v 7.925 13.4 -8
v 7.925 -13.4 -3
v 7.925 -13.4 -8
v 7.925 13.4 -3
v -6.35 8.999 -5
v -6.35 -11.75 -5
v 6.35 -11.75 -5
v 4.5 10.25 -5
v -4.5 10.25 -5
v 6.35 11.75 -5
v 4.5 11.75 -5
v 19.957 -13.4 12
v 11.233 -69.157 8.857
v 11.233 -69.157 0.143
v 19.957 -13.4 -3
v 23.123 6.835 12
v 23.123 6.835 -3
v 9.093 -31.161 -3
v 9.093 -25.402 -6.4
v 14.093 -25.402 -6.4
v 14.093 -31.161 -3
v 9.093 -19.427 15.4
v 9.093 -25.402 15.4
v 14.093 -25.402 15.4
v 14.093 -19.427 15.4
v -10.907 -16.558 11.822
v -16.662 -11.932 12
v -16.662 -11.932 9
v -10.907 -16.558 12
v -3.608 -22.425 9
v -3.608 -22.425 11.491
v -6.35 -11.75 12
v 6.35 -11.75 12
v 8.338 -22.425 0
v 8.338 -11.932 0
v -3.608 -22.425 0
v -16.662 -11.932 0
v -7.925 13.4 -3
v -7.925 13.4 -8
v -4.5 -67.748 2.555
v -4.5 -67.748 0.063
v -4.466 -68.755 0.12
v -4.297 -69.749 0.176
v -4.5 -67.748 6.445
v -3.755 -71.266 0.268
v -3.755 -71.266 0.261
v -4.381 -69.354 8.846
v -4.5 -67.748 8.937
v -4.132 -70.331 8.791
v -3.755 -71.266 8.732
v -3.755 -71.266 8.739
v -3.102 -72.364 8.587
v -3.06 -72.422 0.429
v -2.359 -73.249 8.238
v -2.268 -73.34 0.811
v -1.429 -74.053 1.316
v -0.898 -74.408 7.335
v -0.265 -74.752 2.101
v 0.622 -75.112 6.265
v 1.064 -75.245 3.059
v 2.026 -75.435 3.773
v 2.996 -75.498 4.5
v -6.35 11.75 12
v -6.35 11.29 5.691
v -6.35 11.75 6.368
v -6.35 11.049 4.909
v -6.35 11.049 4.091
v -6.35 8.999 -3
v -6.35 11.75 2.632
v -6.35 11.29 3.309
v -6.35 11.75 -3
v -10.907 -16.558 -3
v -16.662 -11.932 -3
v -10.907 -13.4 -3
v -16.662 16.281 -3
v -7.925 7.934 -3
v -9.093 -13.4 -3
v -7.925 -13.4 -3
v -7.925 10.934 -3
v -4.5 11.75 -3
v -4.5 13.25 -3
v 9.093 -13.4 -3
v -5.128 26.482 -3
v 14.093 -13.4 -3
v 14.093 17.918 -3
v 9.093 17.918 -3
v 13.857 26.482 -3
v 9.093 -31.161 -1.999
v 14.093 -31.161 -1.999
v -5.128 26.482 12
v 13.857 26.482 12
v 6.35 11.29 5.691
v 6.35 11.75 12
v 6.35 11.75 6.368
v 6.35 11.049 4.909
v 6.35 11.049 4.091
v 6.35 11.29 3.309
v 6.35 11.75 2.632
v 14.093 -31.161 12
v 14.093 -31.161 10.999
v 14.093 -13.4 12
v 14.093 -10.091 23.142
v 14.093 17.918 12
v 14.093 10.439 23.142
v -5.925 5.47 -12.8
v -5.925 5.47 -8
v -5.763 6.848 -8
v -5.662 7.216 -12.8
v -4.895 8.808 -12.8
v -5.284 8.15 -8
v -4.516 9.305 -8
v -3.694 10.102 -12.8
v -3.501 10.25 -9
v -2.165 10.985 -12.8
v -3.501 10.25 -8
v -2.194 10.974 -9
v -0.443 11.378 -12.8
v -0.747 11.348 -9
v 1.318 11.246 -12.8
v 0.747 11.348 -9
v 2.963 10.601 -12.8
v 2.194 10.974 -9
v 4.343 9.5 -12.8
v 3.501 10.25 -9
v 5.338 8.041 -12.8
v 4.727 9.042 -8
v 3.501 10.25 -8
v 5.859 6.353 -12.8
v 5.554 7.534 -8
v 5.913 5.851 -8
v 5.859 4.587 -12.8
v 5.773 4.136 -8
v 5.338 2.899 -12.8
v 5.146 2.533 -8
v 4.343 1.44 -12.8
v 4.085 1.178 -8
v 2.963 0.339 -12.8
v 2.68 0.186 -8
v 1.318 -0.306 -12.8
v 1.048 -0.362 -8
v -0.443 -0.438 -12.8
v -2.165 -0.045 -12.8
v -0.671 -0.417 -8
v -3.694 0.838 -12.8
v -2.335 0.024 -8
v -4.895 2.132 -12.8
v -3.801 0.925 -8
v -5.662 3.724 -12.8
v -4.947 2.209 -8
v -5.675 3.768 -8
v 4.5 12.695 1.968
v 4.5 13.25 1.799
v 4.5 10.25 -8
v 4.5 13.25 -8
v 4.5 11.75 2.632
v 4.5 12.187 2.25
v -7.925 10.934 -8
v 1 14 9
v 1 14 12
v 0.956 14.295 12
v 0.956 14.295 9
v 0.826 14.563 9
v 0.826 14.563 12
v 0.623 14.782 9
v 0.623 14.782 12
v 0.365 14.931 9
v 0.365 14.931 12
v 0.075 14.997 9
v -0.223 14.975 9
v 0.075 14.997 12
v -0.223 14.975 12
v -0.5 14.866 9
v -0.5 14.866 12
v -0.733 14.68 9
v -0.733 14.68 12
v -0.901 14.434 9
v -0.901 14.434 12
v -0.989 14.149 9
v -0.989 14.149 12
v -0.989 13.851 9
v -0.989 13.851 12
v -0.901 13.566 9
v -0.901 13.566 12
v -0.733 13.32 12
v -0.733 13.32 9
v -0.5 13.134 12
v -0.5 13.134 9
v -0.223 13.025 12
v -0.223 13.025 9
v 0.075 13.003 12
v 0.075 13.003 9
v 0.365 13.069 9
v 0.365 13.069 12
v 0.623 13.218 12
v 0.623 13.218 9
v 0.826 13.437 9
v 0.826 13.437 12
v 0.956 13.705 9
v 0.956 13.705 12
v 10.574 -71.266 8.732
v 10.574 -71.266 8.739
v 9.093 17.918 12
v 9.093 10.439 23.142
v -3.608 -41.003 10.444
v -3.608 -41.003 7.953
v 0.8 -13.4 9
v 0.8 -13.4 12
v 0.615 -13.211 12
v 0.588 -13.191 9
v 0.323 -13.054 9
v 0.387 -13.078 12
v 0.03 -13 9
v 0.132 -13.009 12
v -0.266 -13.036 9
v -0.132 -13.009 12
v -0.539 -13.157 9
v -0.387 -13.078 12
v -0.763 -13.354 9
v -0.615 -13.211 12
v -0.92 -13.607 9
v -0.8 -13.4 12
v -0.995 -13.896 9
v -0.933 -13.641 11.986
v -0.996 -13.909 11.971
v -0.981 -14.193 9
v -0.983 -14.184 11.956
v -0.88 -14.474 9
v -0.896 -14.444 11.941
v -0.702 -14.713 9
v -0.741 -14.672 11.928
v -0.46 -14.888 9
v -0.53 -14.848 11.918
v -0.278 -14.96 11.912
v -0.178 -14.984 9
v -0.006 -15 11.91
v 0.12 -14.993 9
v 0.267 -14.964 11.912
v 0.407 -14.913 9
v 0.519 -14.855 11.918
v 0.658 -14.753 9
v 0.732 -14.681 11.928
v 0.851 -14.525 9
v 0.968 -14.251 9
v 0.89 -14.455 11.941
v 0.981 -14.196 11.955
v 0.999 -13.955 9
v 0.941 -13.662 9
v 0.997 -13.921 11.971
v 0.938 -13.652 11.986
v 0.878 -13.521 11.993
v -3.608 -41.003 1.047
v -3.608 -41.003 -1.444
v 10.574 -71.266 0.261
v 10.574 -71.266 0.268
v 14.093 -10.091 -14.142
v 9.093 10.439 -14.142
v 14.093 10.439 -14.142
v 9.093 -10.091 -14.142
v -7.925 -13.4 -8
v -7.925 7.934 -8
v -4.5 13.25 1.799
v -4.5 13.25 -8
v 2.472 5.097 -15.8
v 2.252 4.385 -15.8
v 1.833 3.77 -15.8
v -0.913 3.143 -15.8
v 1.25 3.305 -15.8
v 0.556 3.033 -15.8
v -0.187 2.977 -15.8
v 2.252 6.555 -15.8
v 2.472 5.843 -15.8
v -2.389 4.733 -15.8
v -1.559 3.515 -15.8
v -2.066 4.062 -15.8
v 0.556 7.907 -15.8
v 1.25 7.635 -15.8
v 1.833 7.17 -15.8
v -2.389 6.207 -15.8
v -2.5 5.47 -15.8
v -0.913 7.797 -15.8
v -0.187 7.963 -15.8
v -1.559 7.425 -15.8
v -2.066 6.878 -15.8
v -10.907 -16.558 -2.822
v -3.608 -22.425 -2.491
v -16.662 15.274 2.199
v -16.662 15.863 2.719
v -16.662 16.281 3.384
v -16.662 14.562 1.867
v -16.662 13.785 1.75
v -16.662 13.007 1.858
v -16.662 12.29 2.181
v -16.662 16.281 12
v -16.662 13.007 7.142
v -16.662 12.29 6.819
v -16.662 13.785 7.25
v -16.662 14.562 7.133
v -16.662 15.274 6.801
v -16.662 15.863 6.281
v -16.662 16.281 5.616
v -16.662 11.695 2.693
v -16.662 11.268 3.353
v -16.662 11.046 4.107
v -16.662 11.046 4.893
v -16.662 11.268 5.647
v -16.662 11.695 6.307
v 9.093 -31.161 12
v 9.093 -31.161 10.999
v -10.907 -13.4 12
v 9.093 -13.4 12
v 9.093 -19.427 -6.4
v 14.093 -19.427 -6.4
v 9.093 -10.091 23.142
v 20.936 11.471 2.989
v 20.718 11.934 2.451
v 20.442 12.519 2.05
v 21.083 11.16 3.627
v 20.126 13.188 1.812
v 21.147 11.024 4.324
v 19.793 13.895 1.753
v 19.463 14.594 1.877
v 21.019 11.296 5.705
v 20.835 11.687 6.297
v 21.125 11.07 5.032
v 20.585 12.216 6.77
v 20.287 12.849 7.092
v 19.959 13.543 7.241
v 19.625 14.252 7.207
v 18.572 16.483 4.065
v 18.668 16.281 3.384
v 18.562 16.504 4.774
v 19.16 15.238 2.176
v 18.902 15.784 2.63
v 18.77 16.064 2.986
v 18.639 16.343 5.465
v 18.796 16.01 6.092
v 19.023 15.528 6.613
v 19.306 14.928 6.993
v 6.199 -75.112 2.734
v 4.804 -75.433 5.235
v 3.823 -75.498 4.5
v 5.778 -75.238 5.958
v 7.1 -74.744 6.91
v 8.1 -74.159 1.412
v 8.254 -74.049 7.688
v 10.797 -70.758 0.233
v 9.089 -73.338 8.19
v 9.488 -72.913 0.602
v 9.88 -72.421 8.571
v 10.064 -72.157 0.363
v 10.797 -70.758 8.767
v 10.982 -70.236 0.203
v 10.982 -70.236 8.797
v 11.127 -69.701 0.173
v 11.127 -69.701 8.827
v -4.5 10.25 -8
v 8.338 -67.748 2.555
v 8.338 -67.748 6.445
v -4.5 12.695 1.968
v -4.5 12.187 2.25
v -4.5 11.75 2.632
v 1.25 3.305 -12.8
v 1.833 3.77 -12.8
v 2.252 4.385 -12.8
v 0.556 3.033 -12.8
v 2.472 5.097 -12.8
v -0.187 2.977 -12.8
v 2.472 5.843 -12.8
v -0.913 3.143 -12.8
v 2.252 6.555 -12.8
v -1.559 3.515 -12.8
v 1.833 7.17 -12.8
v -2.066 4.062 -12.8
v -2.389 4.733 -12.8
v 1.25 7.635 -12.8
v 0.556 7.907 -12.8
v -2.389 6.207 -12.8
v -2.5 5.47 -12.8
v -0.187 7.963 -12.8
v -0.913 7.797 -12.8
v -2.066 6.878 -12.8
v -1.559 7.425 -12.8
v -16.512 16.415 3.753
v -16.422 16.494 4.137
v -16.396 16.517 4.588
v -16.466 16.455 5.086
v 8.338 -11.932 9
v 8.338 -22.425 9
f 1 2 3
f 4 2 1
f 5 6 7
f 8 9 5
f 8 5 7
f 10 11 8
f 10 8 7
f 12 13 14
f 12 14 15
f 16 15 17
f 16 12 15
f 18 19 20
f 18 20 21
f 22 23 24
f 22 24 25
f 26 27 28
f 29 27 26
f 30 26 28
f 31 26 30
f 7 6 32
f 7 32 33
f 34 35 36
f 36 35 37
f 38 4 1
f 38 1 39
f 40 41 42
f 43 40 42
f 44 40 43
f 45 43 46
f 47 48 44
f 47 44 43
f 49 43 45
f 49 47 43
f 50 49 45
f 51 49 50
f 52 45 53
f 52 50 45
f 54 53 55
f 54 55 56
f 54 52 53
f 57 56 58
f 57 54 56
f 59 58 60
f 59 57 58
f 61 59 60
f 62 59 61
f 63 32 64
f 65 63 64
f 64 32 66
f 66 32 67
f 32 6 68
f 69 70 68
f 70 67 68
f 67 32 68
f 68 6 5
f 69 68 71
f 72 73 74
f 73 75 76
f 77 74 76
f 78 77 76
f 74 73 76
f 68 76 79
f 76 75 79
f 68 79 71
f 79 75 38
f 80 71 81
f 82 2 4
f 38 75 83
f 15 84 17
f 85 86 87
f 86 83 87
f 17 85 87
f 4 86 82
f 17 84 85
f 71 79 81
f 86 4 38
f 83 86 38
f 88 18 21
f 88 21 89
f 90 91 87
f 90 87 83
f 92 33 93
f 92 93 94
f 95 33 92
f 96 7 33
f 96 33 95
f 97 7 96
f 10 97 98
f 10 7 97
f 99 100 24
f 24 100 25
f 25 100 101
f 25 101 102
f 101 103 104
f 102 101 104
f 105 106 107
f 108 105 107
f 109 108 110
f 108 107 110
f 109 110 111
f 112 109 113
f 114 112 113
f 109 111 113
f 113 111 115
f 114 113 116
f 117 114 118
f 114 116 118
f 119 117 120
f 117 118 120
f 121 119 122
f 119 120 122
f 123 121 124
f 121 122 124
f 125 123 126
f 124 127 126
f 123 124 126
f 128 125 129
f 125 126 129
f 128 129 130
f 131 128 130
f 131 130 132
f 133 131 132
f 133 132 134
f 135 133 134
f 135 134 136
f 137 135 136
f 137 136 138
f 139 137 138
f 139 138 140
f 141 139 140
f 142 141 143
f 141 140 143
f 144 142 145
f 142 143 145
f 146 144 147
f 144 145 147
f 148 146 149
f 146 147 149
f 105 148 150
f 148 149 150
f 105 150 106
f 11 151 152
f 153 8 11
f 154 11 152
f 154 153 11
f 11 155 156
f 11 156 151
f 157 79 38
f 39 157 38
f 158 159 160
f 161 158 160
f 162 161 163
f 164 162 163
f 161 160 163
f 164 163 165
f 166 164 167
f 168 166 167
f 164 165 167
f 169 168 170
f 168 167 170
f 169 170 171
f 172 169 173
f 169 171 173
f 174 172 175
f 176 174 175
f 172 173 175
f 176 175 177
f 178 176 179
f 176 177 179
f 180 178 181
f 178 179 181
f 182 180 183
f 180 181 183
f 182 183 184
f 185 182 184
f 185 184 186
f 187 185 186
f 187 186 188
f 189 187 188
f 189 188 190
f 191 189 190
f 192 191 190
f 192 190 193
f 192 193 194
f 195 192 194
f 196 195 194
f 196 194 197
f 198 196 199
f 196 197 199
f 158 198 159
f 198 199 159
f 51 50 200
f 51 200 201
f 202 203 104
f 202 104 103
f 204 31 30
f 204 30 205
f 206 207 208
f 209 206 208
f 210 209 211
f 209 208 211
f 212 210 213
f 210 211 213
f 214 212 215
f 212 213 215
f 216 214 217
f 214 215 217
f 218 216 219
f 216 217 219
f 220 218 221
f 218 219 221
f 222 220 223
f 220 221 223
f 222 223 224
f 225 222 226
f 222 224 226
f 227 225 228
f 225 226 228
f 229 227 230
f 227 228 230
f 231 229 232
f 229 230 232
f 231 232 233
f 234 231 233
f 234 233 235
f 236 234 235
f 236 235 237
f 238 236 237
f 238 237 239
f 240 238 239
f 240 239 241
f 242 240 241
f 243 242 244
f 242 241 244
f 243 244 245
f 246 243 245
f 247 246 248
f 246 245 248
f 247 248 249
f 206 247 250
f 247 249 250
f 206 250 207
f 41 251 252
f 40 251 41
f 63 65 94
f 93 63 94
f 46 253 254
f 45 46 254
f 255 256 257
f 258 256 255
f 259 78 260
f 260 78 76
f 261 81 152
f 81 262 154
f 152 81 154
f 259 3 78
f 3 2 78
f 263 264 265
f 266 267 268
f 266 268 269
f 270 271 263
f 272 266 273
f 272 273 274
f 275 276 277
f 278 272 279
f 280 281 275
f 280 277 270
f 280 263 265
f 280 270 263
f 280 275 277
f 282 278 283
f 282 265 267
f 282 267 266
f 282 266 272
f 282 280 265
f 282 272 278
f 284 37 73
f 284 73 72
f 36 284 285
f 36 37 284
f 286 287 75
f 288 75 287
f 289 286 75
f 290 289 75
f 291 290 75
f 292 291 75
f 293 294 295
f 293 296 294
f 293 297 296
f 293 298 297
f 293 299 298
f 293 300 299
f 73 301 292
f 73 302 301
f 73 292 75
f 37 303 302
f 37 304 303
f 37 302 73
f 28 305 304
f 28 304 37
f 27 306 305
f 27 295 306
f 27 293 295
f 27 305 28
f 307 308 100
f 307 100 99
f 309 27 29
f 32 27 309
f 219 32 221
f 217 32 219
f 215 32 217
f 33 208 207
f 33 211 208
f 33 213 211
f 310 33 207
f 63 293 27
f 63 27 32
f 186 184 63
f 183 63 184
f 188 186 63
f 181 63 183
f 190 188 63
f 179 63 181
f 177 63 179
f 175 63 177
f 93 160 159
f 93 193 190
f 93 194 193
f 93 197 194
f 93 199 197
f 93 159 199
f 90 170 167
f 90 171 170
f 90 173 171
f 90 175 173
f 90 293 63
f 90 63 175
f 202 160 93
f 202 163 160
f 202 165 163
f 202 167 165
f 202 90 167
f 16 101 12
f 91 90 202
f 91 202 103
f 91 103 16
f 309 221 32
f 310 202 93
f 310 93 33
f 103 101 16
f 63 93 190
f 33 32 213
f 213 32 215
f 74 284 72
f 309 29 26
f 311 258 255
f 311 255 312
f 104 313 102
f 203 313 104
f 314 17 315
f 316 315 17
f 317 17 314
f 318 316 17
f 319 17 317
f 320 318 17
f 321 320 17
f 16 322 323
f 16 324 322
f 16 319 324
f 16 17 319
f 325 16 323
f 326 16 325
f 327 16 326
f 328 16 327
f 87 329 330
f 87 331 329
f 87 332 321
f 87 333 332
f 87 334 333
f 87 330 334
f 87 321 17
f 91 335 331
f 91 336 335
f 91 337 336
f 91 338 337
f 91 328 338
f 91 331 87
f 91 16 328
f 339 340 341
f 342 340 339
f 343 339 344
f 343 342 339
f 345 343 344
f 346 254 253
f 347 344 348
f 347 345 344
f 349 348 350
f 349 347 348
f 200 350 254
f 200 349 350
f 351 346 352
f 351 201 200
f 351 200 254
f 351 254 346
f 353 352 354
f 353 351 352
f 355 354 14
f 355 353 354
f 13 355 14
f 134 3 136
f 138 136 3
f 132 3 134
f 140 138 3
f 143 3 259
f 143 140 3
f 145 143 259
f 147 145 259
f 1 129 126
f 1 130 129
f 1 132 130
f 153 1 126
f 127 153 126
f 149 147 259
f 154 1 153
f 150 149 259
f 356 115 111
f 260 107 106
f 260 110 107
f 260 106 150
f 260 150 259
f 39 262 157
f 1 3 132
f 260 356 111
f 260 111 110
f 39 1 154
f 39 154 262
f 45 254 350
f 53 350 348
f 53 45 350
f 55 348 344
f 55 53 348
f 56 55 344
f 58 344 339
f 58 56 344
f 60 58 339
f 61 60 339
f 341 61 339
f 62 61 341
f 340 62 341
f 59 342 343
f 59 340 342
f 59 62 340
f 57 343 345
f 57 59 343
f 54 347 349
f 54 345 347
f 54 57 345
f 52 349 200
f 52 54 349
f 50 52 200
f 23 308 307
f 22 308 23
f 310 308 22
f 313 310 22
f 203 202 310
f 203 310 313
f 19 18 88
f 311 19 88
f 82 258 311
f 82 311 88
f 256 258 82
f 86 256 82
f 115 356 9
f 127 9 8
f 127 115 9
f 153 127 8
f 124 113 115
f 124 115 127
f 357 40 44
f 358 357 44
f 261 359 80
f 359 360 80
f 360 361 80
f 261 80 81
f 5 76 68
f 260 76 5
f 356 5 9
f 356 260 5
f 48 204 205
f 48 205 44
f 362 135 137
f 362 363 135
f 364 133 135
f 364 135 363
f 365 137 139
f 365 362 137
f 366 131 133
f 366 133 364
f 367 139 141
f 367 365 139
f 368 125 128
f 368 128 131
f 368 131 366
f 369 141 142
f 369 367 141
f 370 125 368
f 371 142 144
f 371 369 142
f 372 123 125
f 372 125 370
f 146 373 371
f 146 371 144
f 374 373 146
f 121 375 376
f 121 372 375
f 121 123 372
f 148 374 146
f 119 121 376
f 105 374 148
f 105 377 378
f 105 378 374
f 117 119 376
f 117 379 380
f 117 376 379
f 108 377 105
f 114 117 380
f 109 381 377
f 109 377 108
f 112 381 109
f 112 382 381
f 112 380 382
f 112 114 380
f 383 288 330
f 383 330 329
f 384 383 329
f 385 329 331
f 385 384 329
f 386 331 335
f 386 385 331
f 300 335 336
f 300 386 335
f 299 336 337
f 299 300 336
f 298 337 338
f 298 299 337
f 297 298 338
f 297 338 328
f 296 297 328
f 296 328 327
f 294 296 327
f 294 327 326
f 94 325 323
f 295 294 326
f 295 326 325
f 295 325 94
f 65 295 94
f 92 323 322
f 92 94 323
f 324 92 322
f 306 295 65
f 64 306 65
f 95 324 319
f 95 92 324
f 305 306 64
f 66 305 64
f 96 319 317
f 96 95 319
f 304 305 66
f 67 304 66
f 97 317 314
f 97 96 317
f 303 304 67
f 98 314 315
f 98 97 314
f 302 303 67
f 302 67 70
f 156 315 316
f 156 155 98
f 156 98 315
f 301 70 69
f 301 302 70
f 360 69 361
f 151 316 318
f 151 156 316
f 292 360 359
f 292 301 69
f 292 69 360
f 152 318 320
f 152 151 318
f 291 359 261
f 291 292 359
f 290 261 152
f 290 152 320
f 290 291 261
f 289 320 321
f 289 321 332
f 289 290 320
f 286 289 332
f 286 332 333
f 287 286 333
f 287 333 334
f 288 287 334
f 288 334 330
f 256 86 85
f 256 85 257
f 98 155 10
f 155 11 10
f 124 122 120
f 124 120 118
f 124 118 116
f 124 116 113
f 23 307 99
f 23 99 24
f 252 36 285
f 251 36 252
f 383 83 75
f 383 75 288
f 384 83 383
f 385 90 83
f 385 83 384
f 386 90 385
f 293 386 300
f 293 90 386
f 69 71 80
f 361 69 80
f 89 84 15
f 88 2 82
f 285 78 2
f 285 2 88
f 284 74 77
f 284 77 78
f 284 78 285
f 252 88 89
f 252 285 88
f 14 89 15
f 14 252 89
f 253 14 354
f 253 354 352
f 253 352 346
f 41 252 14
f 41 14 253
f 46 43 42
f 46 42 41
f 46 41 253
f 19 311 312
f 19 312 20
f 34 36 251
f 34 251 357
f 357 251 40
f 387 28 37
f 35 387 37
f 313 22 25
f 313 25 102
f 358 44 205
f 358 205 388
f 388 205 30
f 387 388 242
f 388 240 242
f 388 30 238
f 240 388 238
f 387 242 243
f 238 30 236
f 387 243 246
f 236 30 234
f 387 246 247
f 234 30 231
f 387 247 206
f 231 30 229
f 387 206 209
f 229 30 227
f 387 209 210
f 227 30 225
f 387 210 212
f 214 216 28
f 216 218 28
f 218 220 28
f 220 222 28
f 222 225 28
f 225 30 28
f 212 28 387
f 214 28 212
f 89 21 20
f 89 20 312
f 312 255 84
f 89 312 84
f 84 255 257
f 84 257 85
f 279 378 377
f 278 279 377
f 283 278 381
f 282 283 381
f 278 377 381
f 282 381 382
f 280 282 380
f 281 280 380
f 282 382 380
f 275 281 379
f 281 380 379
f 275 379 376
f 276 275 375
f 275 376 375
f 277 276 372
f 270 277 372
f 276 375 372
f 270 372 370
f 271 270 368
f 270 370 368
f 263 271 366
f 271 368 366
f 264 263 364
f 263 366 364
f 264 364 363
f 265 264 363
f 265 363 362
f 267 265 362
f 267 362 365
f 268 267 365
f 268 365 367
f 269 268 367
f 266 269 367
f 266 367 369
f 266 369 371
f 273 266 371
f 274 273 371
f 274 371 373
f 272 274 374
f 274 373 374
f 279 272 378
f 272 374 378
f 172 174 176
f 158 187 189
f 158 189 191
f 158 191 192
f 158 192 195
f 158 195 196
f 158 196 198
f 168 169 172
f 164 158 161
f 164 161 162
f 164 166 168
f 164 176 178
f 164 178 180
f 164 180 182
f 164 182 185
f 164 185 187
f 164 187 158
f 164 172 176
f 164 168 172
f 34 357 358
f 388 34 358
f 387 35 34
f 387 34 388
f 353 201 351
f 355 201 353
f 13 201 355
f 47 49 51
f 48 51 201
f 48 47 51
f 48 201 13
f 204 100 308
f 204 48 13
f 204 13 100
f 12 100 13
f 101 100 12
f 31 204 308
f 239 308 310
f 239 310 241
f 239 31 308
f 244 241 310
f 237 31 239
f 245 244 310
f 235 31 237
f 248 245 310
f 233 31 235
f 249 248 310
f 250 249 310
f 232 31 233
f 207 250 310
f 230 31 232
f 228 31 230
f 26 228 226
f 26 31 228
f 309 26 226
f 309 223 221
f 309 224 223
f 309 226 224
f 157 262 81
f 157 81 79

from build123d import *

# Parameters (mm, degrees)
SKETCH1_R                = 15
SKETCH1_W                = 14.5
SKETCH1_H                = 22.8
BOSS_EXTRUDE1_DEPTH      = 12
CUT_EXTRUDE1_DEPTH       = 24
BOSS_EXTRUDE2_START      = -12
BOSS_EXTRUDE2_DEPTH      = 12
FILLET1_R                = 5
FILLET2_R                = 5
BOSS_EXTRUDE4_DEPTH      = 12
BOSS_EXTRUDE7_DEPTH      = 10
SKETCH9_R                = 7.25
BOSS_EXTRUDE9_DEPTH      = 6.6
SKETCH10_R               = 2.5
BOSS_EXTRUDE10_DEPTH     = 3
FILLET3_R                = 10
FILLET5_R                = 10
SKETCH11_W               = 2.40686952
SKETCH11_H               = 3
SKETCH11_W_2             = 3
SKETCH11_H_2             = 2.40686952
CUT_EXTRUDE2_DEPTH       = 10
SKETCH13_W               = 18.18626096
SKETCH13_H               = 26.685750205
BOSS_EXTRUDE11_DEPTH     = 3.6
SKETCH15_W               = 18.18626096
SKETCH15_H               = 26.685750205
SKETCH15_W_2             = 14.5
SKETCH15_H_2             = 22.8
BOSS_EXTRUDE12_DEPTH     = 13.6
SKETCH17_W               = 88.544213988
SKETCH17_H               = 130.772992967
SKETCH17_W_2             = 18.18626096
SKETCH17_H_2             = 26.685750205
CUT_EXTRUDE3_DEPTH       = 13.6
BOSS_EXTRUDE16_DEPTH     = 15
CUT_EXTRUDE6_DEPTH       = 20
CUT_EXTRUDE6_DEPTH_BACK  = 20
BOSS_EXTRUDE17_DEPTH     = 5
CUT_EXTRUDE7_DEPTH       = 25
CUT_EXTRUDE7_DEPTH_BACK  = 15
SKETCH25_W               = 14.18626096
SKETCH25_H               = 22.685750205
CUT_EXTRUDE8_DEPTH       = 20
SKETCH26_R               = 1
CUT_EXTRUDE9_DEPTH       = 3
CUT_EXTRUDE12_DEPTH      = 25
SKETCH29_W               = 13.770233496
SKETCH29_H               = 29.611444499
CUT_EXTRUDE13_DEPTH      = 48
SKETCH30_W               = 12
SKETCH30_H               = 22.8
CUT_EXTRUDE14_DEPTH      = 48
SKETCH32_W               = 2
SKETCH32_H               = 22.8
BOSS_EXTRUDE23_DEPTH     = 17
SKETCH33_W               = 15.85
SKETCH33_H               = 2
BOSS_EXTRUDE24_DEPTH     = 4
SKETCH34_W               = 15.85
SKETCH34_H               = 26.8
BOSS_EXTRUDE25_DEPTH     = 3
SKETCH35_R               = 5.925
BOSS_EXTRUDE26_DEPTH     = 4.8
SKETCH36_R               = 2.5
BOSS_EXTRUDE27_DEPTH     = 3
SKETCH37_W               = 12.7
SKETCH37_H               = 23.5
CUT_EXTRUDE15_DEPTH      = 63
CUT_EXTRUDE16_DEPTH      = 8
CUT_EXTRUDE16_DEPTH_BACK = 4
SKETCH38_W               = 9
SKETCH38_H               = 3
CUT_EXTRUDE17_DEPTH      = 5
CUT_EXTRUDE18_DEPTH      = 31
CUT_EXTRUDE18_DEPTH_BACK = 50
SKETCH40_R               = 2.75


# Read off the part's stored shape, not the designer's step: Boss-Extrude2
with BuildPart() as part:
    # Sketch1 → Boss-Extrude1 (new body)
    # profile 1 of 2: a face of its own
    with BuildSketch(Plane.XY):
        Circle(SKETCH1_R)
        Rectangle(SKETCH1_W, SKETCH1_H, mode=Mode.SUBTRACT)
    # profile 2 of 2: a face of its own
    with BuildSketch(Plane.XY):
        with BuildLine():
            Line((34.889014039, -14.726662295), (10.829823077, 10.378580449))
            ThreePointArc((10.829823077, 10.378580449), (13.918465184, 5.5925242), (15, 0))
            ThreePointArc((15, 0), (8.274705986, -12.511164648), (-5.870565447, -13.803494533))
            Line((-5.870565447, -13.803494533), (11.720818789, -21.285032793))
            Line((11.720818789, -21.285032793), (7.17598603, -56.938690475))
            Line((7.17598603, -56.938690475), (22.17598603, -56.938690475))
            Line((22.17598603, -56.938690475), (34.889014039, -14.726662295))
        make_face()
    extrude(amount=BOSS_EXTRUDE1_DEPTH)

    # Sketch4 → Cut-Extrude1 (cut)
    with BuildSketch(Plane.XY.offset(12)):
        Polygon((25.908479053, -5.355669266), (45.608770936, -16.450233145), (32.401525551, -58.978549805), (15.005502416, -56.938690475), align=None)
    extrude(amount=-CUT_EXTRUDE1_DEPTH, mode=Mode.SUBTRACT)

    # Boss-Extrude2 outline → Boss-Extrude2 (add)
    with BuildSketch(Plane.XY.offset(12).offset(BOSS_EXTRUDE2_START)):
        with BuildLine():
            Line((5.606806504, -22.40394756), (1.154595891, -56.938690475))
            Line((1.154595891, -56.938690475), (7.17598603, -56.938690475))
            Line((7.17598603, -56.938690475), (11.720818789, -21.285032793))
            Line((11.720818789, -21.285032793), (-5.870565447, -13.803494533))
            ThreePointArc((-5.870565447, -13.803494533), (-7.327726293, -13.088331726), (-8.699078631, -12.219903066))
            Line((-8.699078631, -12.219903066), (5.606806504, -22.40394756))
        make_face()
    extrude(amount=BOSS_EXTRUDE2_DEPTH)

    # Fillet1
    fillet1_edges = [part.edges().sort_by_distance(p)[0] for p in [
        (1.154595891, -56.938690475, 6),
    ]]
    fillet(fillet1_edges, radius=FILLET1_R)

    # Fillet2
    fillet2_edges = [part.edges().sort_by_distance(p)[0] for p in [
        (15.005502416, -56.938690475, 6),
    ]]
    fillet(fillet2_edges, radius=FILLET2_R)

    # Sketch5 → Boss-Extrude4 (add)
    with BuildSketch(Plane(origin=(0, 0, 0), x_dir=(-1, 0, 0), z_dir=(0, 0, -1))):
        with BuildLine():
            Line((-2.448312302, -26.293012267), (11.598771509, -16.293204089))
            ThreePointArc((11.598771509, -16.293204089), (15.246223493, 12.944213735), (-14.195603849, 14.088464479))
            Line((-14.195603849, 14.088464479), (-32.784425655, -4.641720828))
            Line((-32.784425655, -4.641720828), (-16.822475194, -80.159229174))
            Line((-16.822475194, -80.159229174), (4.496107211, -80.159229174))
            Line((4.496107211, -80.159229174), (-2.448312302, -26.293012267))
        make_face()
        with BuildLine():
            Line((-25.908479053, -5.355669266), (-10.829823077, 10.378580449))
            ThreePointArc((-10.829823077, 10.378580449), (11.349356029, 9.807758038), (8.699078632, -12.219903067))
            Line((8.699078631, -12.219903066), (-5.606806504, -22.40394756))
            Line((-5.606806504, -22.40394756), (-1.88161409, -51.29938255))
            ThreePointArc((-1.88161409, -51.29938255), (-3.085807921, -55.240467298), (-6.8405742, -56.938690475))
            Line((-6.8405742, -56.938690475), (-10.951869916, -56.938690475))
            ThreePointArc((-10.951869916, -56.938690475), (-14.100682132, -55.822629407), (-15.843787659, -52.972683126))
            Line((-15.843787659, -52.972683126), (-25.908479053, -5.355669266))
        make_face(mode=Mode.SUBTRACT)
    extrude(amount=-BOSS_EXTRUDE4_DEPTH)

    # Sketch6 → Boss-Extrude7 (add)
    with BuildSketch(Plane(origin=(0, 0, 0), x_dir=(-1, 0, 0), z_dir=(0, 0, -1))):
        Polygon((-11.5, 2.65), (-7.25, 2.65), (-7.25, 4.15), (-7.25, 5.65), (-11.5, 5.65), align=None)
        with BuildLine():
            Line((-7.25, 2.65), (-7.09313048, 2.65))
            ThreePointArc((-7.09313048, 2.65), (-7.210675973, 3.395909812), (-7.25, 4.15))
            Line((-7.25, 4.15), (-7.25, 2.65))
        make_face()
        with BuildLine():
            Line((-7.25, 5.65), (-7.25, 4.15))
            ThreePointArc((-7.25, 4.15), (-7.210675973, 4.904090188), (-7.09313048, 5.65))
            Line((-7.09313048, 5.65), (-7.25, 5.65))
        make_face()
        Polygon((0, 11.4), (1.5, 11.4), (1.5, 15.65), (-1.5, 15.65), (-1.5, 11.4), align=None)
        with BuildLine():
            Line((-1.5, 11.4), (-1.5, 11.24313048))
            ThreePointArc((-1.5, 11.24313048), (-0.754090188, 11.360675973), (0, 11.4))
            Line((0, 11.4), (-1.5, 11.4))
        make_face()
        with BuildLine():
            ThreePointArc((0, 11.4), (0.754090188, 11.360675973), (1.5, 11.24313048))
            Line((1.5, 11.24313048), (1.5, 11.4))
            Line((1.5, 11.4), (0, 11.4))
        make_face()
        Polygon((7.25, 4.15), (7.25, 2.65), (11.5, 2.65), (11.5, 5.65), (7.25, 5.65), align=None)
        with BuildLine():
            ThreePointArc((7.09313048, 5.65), (7.210675973, 4.904090188), (7.25, 4.15))
            Line((7.25, 4.15), (7.25, 5.65))
            Line((7.25, 5.65), (7.09313048, 5.65))
        make_face()
        with BuildLine():
            ThreePointArc((7.25, 4.15), (7.210675973, 3.395909812), (7.09313048, 2.65))
            Line((7.09313048, 2.65), (7.25, 2.65))
            Line((7.25, 2.65), (7.25, 4.15))
        make_face()
    extrude(amount=BOSS_EXTRUDE7_DEPTH)

    # Sketch9 → Boss-Extrude9 (add)
    with BuildSketch(Plane(origin=(0, 0, -6.4), x_dir=(-1, 0, 0), z_dir=(0, 0, -1))):
        with Locations(Location((0, 4.15, 0), (0, 0, 168.059456039))):
            Circle(SKETCH9_R)
    extrude(amount=BOSS_EXTRUDE9_DEPTH)

    # Sketch10 → Boss-Extrude10 (add)
    with BuildSketch(Plane(origin=(0, 0, -13), x_dir=(-1, 0, 0), z_dir=(0, 0, -1))):
        with Locations((0, 4.15)):
            Circle(SKETCH10_R)
    extrude(amount=BOSS_EXTRUDE10_DEPTH)

    # Fillet3
    fillet3_edges = [part.edges().sort_by_distance(p)[0] for p in [
        (-4.496107211, -80.159229174, 6),
    ]]
    fillet(fillet3_edges, radius=FILLET3_R)

    # Fillet5
    fillet5_edges = [part.edges().sort_by_distance(p)[0] for p in [
        (16.822475194, -80.159229174, 6),
    ]]
    fillet(fillet5_edges, radius=FILLET5_R)

    # Sketch11 → Cut-Extrude2 (cut)
    with BuildSketch(Plane(origin=(0, 0, -10), x_dir=(-1, 0, 0), z_dir=(0, 0, -1))):
        with Locations((10.29656524, 4.15)):
            Rectangle(SKETCH11_W, SKETCH11_H)
        with Locations((-10.29656524, 4.15)):
            Rectangle(SKETCH11_W, SKETCH11_H)
        with Locations((0, 14.44656524)):
            Rectangle(SKETCH11_W_2, SKETCH11_H_2)
    extrude(amount=-CUT_EXTRUDE2_DEPTH, mode=Mode.SUBTRACT)

    # Sketch13 → Boss-Extrude11 (add)
    with BuildSketch(Plane(origin=(0, 0, -10), x_dir=(-1, 0, 0), z_dir=(0, 0, -1))):
        with Locations((0, -0.057124897)):
            Rectangle(SKETCH13_W, SKETCH13_H)
    extrude(amount=-BOSS_EXTRUDE11_DEPTH)

    # Sketch15 → Boss-Extrude12 (add)
    with BuildSketch(Plane(origin=(0, 0, -10), x_dir=(-1, 0, 0), z_dir=(0, 0, -1))):
        with Locations((0, -0.057124897)):
            Rectangle(SKETCH15_W, SKETCH15_H)
        Rectangle(SKETCH15_W_2, SKETCH15_H_2, mode=Mode.SUBTRACT)
    extrude(amount=-BOSS_EXTRUDE12_DEPTH)

    # Sketch17 → Cut-Extrude3 (cut)
    with BuildSketch(Plane(origin=(0, 0, 0), x_dir=(-1, 0, 0), z_dir=(0, 0, -1))):
        with Locations((-15.076356892, -26.777764381)):
            Rectangle(SKETCH17_W, SKETCH17_H)
        with Locations((0, -0.057124897)):
            Rectangle(SKETCH17_W_2, SKETCH17_H_2, mode=Mode.SUBTRACT)
    extrude(amount=-CUT_EXTRUDE3_DEPTH, mode=Mode.SUBTRACT)

    # Sketch18 → Boss-Extrude16 (add)
    with BuildSketch(Plane.XY.offset(12)):
        with BuildLine():
            Line((11.233307191, -69.15695845), (23.12256473, 6.835135095))
            Line((23.12256473, 6.835135095), (13.856935522, 26.481884794))
            Line((13.856935522, 26.481884794), (-5.128379784, 26.481884794))
            Line((-5.128379784, 26.481884794), (-16.662343589, 16.28148622))
            Line((-16.662343589, 16.28148622), (-16.662343589, -11.932277882))
            Line((-16.662343589, -11.932277882), (-3.607666978, -22.42507862))
            Line((-3.607666978, -22.42507862), (-3.607666978, -41.0028204))
            Line((-3.607666978, -41.0028204), (-4.500106941, -67.747530096))
            ThreePointArc((-4.500106941, -67.747530096), (-2.395287871, -73.211774888), (2.995720994, -75.497657186))
            Line((2.995720994, -75.497657186), (3.823447504, -75.497657186))
            ThreePointArc((3.823447504, -75.497657186), (8.699677632, -73.696111339), (11.233307191, -69.15695845))
        make_face()
    extrude(amount=-BOSS_EXTRUDE16_DEPTH)

    # Sketch22 → Cut-Extrude6 (cut, two sides: drawn at the far end of the back side and taken through both)
    with BuildSketch(Plane(origin=(9.09313048, 0, 0), x_dir=(0, 0, -1), z_dir=(1, 0, 0)).offset(-CUT_EXTRUDE6_DEPTH_BACK)):
        Polygon((-0.5, -75.497657186), (-8.5, -75.497657186), (-12, -13.4), (-17.601804557, -13.4), (-17.601804557, -86.596912876), (8.601804557, -86.596912876), (8.601804557, -13.4), (3, -13.4), align=None)
    extrude(amount=CUT_EXTRUDE6_DEPTH + CUT_EXTRUDE6_DEPTH_BACK, mode=Mode.SUBTRACT)

    # Sketch20 → Boss-Extrude17 (add)
    with BuildSketch(Plane(origin=(9.09313048, 0, 0), x_dir=(0, 0, -1), z_dir=(1, 0, 0))):
        Polygon((3, 17.918244511), (14.141754599, 10.438791043), (14.141754599, -10.090778273), (6.4, -19.427119201), (6.4, -25.402377395), (3, -31.160911677), (-12, -31.160911677), (-15.4, -25.402377395), (-15.4, -19.427119201), (-23.141754599, -10.090778273), (-23.141754599, 10.438791043), (-12, 17.918244511), align=None)
    extrude(amount=BOSS_EXTRUDE17_DEPTH)

    # Sketch24 → Cut-Extrude7 (cut, two sides: drawn at the far end of the back side and taken through both)
    with BuildSketch(Plane(origin=(0, 0, 0), x_dir=(0, 0, -1), z_dir=(1, 0, 0)).offset(-CUT_EXTRUDE7_DEPTH_BACK)):
        with BuildLine():
            Line((-8.73179984, -71.265857346), (-10.447221895, -71.265857346))
            Line((-10.447221895, -71.265857346), (-10.447221895, -79.091973424))
            Line((-10.447221895, -79.091973424), (1.689879503, -79.091973424))
            Line((1.689879503, -79.091973424), (1.689879503, -71.265857346))
            Line((1.689879503, -71.265857346), (-0.26820016, -71.265857346))
            ThreePointArc((-0.26820016, -71.265857346), (-4.5, -75.497657186), (-8.73179984, -71.265857346))
        make_face()
    extrude(amount=CUT_EXTRUDE7_DEPTH + CUT_EXTRUDE7_DEPTH_BACK, mode=Mode.SUBTRACT)

    # Sketch25 → Cut-Extrude8 (cut)
    with BuildSketch(Plane.XY.offset(12)):
        with Locations((0, -0.057124897)):
            Rectangle(SKETCH25_W, SKETCH25_H)
    extrude(amount=-CUT_EXTRUDE8_DEPTH, mode=Mode.SUBTRACT)

    # Sketch26 → Cut-Extrude9 (cut)
    with BuildSketch(Plane.XY.offset(12)):
        with Locations((0, 14)):
            Circle(SKETCH26_R)
        with Locations(Location((0, -14, 0), (0, 0, 36.869897646))):
            Circle(SKETCH26_R)
    extrude(amount=-CUT_EXTRUDE9_DEPTH, mode=Mode.SUBTRACT)

    # Sketch27 → Cut-Extrude12 (cut)
    with BuildSketch(Plane.ZY.offset(16.662343589)):
        Polygon((0, -22.42507862), (2.55450185, -67.747530096), (6.44549815, -67.747530096), (9, -22.42507862), (9, -11.932277882), (0, -11.932277882), align=None)
    extrude(amount=-CUT_EXTRUDE12_DEPTH, mode=Mode.SUBTRACT)

    # Sketch29 → Cut-Extrude13 (cut)
    with BuildSketch(Plane.ZY.offset(-9.09313048)):
        with Locations((-9.885116748, -0.309323441)):
            Rectangle(SKETCH29_W, SKETCH29_H)
    extrude(amount=CUT_EXTRUDE13_DEPTH, mode=Mode.SUBTRACT)

    # Sketch30 → Cut-Extrude14 (cut)
    with BuildSketch(Plane.XY.offset(12)):
        Rectangle(SKETCH30_W, SKETCH30_H)
    extrude(amount=-CUT_EXTRUDE14_DEPTH, mode=Mode.SUBTRACT)

    # Sketch32 → Boss-Extrude23 (add)
    with BuildSketch(Plane.XY.offset(12)):
        Polygon((-5.925, 11.4), (-7.925, 11.4), (-7.925, 9.4), (-7.925, -11.4), (-5.925, -11.4), align=None)
        with Locations((6.925, 0)):
            Rectangle(SKETCH32_W, SKETCH32_H)
    extrude(amount=-BOSS_EXTRUDE23_DEPTH)

    # Sketch33 → Boss-Extrude24 (add)
    with BuildSketch(Plane(origin=(0, 0, -5), x_dir=(-1, 0, 0), z_dir=(0, 0, -1))):
        with Locations((0, 12.4)):
            Rectangle(SKETCH33_W, SKETCH33_H)
        with Locations((0, -12.4)):
            Rectangle(SKETCH33_W, SKETCH33_H)
    extrude(amount=-BOSS_EXTRUDE24_DEPTH)

    # Sketch34 → Boss-Extrude25 (add)
    with BuildSketch(Plane(origin=(0, 0, -5), x_dir=(-1, 0, 0), z_dir=(0, 0, -1))):
        Rectangle(SKETCH34_W, SKETCH34_H)
    extrude(amount=BOSS_EXTRUDE25_DEPTH)

    # Sketch35 → Boss-Extrude26 (add)
    with BuildSketch(Plane(origin=(0, 0, -8), x_dir=(-1, 0, 0), z_dir=(0, 0, -1))):
        with Locations((0, 5.47)):
            Circle(SKETCH35_R)
    extrude(amount=BOSS_EXTRUDE26_DEPTH)

    # Sketch36 → Boss-Extrude27 (add)
    with BuildSketch(Plane(origin=(0, 0, -12.8), x_dir=(-1, 0, 0), z_dir=(0, 0, -1))):
        with Locations((0, 5.47)):
            Circle(SKETCH36_R)
    extrude(amount=BOSS_EXTRUDE27_DEPTH)

    # Sketch37 → Cut-Extrude15 (cut)
    with BuildSketch(Plane.XY.offset(-5)):
        Rectangle(SKETCH37_W, SKETCH37_H)
    extrude(amount=CUT_EXTRUDE15_DEPTH, mode=Mode.SUBTRACT)

    # Sketch38 → Cut-Extrude16 (cut, two sides: drawn at the far end of the back side and taken through both)
    with BuildSketch(Plane.XY.offset(-5).offset(-CUT_EXTRUDE16_DEPTH_BACK)):
        with Locations((0, 11.75)):
            Rectangle(SKETCH38_W, SKETCH38_H)
    extrude(amount=CUT_EXTRUDE16_DEPTH + CUT_EXTRUDE16_DEPTH_BACK, mode=Mode.SUBTRACT)

    # Sketch39 → Cut-Extrude17 (cut)
    with BuildSketch(Plane(origin=(0, 0, -8), x_dir=(-1, 0, 0), z_dir=(0, 0, -1))):
        Polygon((4.5, 13.25), (7.925, 10.934007287), (7.925, 7.934007287), (4.5, 10.25), align=None)
    extrude(amount=-CUT_EXTRUDE17_DEPTH, mode=Mode.SUBTRACT)

    # Sketch40 → Cut-Extrude18 (cut, two sides: drawn at the far end of the back side and taken through both)
    with BuildSketch(Plane(origin=(14.09313048, 0, 0), x_dir=(0, 0, -1), z_dir=(1, 0, 0)).offset(-CUT_EXTRUDE18_DEPTH_BACK)):
        with Locations(Location((-4.5, 13.768011552, 0), (0, 0, 66.062809756))):
            Circle(SKETCH40_R)
    extrude(amount=CUT_EXTRUDE18_DEPTH + CUT_EXTRUDE18_DEPTH_BACK, mode=Mode.SUBTRACT)


solid = part.part
